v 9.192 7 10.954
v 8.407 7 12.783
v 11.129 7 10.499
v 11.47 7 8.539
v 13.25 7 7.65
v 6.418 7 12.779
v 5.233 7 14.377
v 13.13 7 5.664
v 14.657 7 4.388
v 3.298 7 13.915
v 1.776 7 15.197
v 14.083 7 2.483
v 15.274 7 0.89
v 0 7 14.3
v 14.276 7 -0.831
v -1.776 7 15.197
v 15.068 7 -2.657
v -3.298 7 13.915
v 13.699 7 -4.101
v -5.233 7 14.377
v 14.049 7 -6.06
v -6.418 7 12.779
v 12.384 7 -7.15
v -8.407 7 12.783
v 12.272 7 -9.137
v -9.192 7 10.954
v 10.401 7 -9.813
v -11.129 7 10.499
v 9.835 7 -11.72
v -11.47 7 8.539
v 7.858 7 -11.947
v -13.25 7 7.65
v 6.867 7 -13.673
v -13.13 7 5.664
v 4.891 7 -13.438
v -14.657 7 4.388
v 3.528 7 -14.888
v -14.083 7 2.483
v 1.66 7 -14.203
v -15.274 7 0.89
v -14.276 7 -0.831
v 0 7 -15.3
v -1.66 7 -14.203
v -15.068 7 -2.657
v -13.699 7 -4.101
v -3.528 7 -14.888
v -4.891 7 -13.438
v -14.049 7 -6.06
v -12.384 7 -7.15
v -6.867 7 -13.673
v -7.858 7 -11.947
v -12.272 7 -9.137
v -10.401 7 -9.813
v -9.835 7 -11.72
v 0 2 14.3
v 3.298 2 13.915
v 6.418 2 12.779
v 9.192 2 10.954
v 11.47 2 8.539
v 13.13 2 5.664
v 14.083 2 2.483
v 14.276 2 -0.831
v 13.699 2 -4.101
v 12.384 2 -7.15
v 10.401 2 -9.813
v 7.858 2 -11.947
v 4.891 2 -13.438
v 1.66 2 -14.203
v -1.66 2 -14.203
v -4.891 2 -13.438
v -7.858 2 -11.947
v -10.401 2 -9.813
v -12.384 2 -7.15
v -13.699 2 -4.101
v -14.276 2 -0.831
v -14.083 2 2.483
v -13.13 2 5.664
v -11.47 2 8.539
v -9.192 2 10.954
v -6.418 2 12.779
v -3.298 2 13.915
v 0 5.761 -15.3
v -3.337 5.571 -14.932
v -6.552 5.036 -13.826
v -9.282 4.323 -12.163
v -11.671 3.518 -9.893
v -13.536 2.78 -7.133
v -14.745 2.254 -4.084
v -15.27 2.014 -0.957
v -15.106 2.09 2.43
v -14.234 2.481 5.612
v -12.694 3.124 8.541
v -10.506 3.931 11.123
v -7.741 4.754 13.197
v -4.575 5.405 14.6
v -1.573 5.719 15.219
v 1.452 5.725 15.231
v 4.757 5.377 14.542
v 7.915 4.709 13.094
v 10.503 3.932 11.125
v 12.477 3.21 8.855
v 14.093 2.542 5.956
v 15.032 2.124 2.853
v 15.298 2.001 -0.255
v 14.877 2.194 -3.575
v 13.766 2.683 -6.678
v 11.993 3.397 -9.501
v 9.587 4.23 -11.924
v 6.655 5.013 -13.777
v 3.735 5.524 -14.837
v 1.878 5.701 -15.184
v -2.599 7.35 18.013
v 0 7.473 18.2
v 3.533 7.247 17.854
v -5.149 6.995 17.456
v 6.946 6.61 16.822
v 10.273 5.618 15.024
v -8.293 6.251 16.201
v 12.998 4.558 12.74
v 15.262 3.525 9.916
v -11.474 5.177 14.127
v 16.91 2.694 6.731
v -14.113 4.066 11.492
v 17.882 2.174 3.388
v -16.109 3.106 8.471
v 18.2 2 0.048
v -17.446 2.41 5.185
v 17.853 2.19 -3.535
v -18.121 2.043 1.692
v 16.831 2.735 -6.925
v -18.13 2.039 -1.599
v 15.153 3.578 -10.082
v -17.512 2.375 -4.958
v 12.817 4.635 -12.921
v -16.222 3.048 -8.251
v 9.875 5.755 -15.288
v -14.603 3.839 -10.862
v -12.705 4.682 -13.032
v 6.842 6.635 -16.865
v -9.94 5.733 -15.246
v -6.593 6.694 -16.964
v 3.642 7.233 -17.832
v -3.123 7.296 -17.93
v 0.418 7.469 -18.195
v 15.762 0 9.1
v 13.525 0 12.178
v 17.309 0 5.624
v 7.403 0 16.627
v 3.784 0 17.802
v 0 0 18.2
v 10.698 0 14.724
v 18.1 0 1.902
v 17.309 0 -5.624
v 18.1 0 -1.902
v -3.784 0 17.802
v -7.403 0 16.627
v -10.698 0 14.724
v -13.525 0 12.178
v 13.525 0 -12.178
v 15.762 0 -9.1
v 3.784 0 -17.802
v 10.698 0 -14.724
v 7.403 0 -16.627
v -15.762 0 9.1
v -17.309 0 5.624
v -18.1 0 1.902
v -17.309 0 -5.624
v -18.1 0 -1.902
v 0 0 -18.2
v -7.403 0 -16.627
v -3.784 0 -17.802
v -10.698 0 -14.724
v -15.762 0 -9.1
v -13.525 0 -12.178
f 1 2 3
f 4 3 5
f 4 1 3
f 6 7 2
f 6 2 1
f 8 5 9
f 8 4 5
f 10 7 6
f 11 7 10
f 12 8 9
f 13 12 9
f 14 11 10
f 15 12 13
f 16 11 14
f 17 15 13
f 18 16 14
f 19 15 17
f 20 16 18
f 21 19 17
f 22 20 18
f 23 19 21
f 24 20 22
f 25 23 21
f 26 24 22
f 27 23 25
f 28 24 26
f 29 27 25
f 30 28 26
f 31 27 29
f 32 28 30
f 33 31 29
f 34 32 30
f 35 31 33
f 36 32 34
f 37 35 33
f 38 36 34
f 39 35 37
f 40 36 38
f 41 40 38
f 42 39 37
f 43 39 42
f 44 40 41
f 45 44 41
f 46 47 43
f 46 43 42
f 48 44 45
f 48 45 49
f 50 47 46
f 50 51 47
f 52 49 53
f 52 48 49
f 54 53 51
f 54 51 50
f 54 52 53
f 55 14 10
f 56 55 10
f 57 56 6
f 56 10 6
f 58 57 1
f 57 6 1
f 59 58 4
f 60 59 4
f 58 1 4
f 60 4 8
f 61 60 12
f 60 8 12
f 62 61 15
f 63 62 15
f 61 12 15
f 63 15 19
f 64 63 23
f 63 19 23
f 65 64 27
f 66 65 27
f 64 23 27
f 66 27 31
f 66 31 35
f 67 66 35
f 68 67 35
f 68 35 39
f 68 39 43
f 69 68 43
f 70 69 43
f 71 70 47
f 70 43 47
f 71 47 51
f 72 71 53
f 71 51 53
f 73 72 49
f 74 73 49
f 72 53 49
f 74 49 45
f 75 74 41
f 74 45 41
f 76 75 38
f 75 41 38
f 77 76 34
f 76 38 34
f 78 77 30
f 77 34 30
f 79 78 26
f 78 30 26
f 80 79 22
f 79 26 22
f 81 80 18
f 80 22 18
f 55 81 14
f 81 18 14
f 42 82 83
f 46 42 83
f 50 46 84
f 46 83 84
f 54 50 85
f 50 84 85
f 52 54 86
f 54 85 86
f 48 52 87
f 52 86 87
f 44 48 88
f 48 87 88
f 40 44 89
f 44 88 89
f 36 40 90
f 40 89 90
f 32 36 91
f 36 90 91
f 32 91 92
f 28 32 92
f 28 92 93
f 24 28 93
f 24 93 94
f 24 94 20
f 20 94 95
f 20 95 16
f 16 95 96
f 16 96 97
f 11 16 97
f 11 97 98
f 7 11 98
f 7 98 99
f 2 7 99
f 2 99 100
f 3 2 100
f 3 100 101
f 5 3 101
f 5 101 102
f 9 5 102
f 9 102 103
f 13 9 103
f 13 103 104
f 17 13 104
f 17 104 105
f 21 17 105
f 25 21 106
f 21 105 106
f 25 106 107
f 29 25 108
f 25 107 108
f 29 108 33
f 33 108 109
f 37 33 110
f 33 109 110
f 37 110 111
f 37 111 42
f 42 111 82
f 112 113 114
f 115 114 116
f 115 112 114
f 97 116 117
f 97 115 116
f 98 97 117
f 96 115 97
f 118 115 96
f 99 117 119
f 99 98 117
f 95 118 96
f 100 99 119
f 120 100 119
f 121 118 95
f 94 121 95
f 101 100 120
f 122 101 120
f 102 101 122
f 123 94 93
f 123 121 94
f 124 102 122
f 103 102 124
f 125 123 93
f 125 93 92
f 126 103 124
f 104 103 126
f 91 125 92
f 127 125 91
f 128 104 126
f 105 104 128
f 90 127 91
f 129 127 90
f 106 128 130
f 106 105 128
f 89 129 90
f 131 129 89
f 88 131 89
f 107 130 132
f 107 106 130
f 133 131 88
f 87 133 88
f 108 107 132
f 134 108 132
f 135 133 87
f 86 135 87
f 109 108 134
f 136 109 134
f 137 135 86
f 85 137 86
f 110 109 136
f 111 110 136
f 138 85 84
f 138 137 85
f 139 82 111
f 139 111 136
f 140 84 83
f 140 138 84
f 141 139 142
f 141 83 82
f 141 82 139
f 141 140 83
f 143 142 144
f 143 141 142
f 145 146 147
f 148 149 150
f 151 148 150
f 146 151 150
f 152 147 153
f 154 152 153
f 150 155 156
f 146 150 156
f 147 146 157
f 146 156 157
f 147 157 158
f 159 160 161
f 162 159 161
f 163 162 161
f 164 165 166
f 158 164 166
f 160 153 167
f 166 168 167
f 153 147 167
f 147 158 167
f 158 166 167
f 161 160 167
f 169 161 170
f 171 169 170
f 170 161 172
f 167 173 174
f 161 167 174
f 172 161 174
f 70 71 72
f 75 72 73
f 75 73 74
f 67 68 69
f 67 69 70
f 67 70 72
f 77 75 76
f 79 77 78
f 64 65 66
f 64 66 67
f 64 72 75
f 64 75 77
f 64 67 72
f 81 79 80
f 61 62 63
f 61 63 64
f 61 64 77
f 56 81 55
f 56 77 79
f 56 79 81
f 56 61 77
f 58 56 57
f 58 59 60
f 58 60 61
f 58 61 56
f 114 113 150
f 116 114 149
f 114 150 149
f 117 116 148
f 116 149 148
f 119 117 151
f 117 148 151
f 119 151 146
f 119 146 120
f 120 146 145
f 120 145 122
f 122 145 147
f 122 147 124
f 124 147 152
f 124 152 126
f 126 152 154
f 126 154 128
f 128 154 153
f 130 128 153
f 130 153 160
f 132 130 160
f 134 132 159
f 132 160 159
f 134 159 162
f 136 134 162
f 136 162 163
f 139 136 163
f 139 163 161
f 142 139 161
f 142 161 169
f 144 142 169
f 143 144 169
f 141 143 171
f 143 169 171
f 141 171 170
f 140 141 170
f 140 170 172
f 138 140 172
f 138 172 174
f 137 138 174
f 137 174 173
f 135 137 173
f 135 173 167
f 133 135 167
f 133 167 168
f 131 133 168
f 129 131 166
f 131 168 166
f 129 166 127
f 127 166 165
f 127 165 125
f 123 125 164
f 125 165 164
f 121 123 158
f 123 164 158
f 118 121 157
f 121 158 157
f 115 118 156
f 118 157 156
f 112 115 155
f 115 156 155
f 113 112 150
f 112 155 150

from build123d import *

# Parameters (mm, degrees)
SKETCH_1_R               = 18.2
EXTRUDE_1_DEPTH          = 10
CUT_EXTRUDE_1_DEPTH      = 28.613040398
CUT_EXTRUDE_1_DEPTH_BACK = 28.613040398
SKETCH_3_R               = 33
SKETCH_4_R               = 15.3
EXTRUDE_2_DEPTH          = 7
SKETCH_5_R               = 14.3
CUT_EXTRUDE_2_DEPTH      = 5


with BuildPart() as part:
    # 스케치1 → 보스-돌출1 (new body)
    with BuildSketch(Plane(origin=(0, 0, 0), x_dir=(1, 0, 0), z_dir=(0, 1, 0))):
        with Locations(Location((0, 0, 0), (0, 0, 270))):
            Circle(SKETCH_1_R)
    extrude(amount=EXTRUDE_1_DEPTH)

    # 스케치3 → 컷-돌출1 (cut, two sides: drawn at the far end of the back side and taken through both)
    with BuildSketch(Plane(origin=(0, 0, 0), x_dir=(0, 0, -1), z_dir=(1, 0, 0)).offset(-CUT_EXTRUDE_1_DEPTH_BACK)):
        with Locations((0, 35)):
            Circle(SKETCH_3_R)
    extrude(amount=CUT_EXTRUDE_1_DEPTH + CUT_EXTRUDE_1_DEPTH_BACK, mode=Mode.SUBTRACT)

    # 스케치4 → 보스-돌출2 (add)
    with BuildSketch(Plane(origin=(0, 0, 0), x_dir=(1, 0, 0), z_dir=(0, 1, 0))):
        with Locations(Location((0, 0, 0), (0, 0, 90))):
            Circle(SKETCH_4_R)
    extrude(amount=EXTRUDE_2_DEPTH)

    # 스케치5 → 컷-돌출2 (cut)
    with BuildSketch(Plane(origin=(0, 7, 0), x_dir=(1, 0, 0), z_dir=(0, 1, 0))):
        with Locations(Location((0, 0, 0), (0, 0, 270))):
            Circle(SKETCH_5_R)
    extrude(amount=-CUT_EXTRUDE_2_DEPTH, mode=Mode.SUBTRACT)


solid = part.part
